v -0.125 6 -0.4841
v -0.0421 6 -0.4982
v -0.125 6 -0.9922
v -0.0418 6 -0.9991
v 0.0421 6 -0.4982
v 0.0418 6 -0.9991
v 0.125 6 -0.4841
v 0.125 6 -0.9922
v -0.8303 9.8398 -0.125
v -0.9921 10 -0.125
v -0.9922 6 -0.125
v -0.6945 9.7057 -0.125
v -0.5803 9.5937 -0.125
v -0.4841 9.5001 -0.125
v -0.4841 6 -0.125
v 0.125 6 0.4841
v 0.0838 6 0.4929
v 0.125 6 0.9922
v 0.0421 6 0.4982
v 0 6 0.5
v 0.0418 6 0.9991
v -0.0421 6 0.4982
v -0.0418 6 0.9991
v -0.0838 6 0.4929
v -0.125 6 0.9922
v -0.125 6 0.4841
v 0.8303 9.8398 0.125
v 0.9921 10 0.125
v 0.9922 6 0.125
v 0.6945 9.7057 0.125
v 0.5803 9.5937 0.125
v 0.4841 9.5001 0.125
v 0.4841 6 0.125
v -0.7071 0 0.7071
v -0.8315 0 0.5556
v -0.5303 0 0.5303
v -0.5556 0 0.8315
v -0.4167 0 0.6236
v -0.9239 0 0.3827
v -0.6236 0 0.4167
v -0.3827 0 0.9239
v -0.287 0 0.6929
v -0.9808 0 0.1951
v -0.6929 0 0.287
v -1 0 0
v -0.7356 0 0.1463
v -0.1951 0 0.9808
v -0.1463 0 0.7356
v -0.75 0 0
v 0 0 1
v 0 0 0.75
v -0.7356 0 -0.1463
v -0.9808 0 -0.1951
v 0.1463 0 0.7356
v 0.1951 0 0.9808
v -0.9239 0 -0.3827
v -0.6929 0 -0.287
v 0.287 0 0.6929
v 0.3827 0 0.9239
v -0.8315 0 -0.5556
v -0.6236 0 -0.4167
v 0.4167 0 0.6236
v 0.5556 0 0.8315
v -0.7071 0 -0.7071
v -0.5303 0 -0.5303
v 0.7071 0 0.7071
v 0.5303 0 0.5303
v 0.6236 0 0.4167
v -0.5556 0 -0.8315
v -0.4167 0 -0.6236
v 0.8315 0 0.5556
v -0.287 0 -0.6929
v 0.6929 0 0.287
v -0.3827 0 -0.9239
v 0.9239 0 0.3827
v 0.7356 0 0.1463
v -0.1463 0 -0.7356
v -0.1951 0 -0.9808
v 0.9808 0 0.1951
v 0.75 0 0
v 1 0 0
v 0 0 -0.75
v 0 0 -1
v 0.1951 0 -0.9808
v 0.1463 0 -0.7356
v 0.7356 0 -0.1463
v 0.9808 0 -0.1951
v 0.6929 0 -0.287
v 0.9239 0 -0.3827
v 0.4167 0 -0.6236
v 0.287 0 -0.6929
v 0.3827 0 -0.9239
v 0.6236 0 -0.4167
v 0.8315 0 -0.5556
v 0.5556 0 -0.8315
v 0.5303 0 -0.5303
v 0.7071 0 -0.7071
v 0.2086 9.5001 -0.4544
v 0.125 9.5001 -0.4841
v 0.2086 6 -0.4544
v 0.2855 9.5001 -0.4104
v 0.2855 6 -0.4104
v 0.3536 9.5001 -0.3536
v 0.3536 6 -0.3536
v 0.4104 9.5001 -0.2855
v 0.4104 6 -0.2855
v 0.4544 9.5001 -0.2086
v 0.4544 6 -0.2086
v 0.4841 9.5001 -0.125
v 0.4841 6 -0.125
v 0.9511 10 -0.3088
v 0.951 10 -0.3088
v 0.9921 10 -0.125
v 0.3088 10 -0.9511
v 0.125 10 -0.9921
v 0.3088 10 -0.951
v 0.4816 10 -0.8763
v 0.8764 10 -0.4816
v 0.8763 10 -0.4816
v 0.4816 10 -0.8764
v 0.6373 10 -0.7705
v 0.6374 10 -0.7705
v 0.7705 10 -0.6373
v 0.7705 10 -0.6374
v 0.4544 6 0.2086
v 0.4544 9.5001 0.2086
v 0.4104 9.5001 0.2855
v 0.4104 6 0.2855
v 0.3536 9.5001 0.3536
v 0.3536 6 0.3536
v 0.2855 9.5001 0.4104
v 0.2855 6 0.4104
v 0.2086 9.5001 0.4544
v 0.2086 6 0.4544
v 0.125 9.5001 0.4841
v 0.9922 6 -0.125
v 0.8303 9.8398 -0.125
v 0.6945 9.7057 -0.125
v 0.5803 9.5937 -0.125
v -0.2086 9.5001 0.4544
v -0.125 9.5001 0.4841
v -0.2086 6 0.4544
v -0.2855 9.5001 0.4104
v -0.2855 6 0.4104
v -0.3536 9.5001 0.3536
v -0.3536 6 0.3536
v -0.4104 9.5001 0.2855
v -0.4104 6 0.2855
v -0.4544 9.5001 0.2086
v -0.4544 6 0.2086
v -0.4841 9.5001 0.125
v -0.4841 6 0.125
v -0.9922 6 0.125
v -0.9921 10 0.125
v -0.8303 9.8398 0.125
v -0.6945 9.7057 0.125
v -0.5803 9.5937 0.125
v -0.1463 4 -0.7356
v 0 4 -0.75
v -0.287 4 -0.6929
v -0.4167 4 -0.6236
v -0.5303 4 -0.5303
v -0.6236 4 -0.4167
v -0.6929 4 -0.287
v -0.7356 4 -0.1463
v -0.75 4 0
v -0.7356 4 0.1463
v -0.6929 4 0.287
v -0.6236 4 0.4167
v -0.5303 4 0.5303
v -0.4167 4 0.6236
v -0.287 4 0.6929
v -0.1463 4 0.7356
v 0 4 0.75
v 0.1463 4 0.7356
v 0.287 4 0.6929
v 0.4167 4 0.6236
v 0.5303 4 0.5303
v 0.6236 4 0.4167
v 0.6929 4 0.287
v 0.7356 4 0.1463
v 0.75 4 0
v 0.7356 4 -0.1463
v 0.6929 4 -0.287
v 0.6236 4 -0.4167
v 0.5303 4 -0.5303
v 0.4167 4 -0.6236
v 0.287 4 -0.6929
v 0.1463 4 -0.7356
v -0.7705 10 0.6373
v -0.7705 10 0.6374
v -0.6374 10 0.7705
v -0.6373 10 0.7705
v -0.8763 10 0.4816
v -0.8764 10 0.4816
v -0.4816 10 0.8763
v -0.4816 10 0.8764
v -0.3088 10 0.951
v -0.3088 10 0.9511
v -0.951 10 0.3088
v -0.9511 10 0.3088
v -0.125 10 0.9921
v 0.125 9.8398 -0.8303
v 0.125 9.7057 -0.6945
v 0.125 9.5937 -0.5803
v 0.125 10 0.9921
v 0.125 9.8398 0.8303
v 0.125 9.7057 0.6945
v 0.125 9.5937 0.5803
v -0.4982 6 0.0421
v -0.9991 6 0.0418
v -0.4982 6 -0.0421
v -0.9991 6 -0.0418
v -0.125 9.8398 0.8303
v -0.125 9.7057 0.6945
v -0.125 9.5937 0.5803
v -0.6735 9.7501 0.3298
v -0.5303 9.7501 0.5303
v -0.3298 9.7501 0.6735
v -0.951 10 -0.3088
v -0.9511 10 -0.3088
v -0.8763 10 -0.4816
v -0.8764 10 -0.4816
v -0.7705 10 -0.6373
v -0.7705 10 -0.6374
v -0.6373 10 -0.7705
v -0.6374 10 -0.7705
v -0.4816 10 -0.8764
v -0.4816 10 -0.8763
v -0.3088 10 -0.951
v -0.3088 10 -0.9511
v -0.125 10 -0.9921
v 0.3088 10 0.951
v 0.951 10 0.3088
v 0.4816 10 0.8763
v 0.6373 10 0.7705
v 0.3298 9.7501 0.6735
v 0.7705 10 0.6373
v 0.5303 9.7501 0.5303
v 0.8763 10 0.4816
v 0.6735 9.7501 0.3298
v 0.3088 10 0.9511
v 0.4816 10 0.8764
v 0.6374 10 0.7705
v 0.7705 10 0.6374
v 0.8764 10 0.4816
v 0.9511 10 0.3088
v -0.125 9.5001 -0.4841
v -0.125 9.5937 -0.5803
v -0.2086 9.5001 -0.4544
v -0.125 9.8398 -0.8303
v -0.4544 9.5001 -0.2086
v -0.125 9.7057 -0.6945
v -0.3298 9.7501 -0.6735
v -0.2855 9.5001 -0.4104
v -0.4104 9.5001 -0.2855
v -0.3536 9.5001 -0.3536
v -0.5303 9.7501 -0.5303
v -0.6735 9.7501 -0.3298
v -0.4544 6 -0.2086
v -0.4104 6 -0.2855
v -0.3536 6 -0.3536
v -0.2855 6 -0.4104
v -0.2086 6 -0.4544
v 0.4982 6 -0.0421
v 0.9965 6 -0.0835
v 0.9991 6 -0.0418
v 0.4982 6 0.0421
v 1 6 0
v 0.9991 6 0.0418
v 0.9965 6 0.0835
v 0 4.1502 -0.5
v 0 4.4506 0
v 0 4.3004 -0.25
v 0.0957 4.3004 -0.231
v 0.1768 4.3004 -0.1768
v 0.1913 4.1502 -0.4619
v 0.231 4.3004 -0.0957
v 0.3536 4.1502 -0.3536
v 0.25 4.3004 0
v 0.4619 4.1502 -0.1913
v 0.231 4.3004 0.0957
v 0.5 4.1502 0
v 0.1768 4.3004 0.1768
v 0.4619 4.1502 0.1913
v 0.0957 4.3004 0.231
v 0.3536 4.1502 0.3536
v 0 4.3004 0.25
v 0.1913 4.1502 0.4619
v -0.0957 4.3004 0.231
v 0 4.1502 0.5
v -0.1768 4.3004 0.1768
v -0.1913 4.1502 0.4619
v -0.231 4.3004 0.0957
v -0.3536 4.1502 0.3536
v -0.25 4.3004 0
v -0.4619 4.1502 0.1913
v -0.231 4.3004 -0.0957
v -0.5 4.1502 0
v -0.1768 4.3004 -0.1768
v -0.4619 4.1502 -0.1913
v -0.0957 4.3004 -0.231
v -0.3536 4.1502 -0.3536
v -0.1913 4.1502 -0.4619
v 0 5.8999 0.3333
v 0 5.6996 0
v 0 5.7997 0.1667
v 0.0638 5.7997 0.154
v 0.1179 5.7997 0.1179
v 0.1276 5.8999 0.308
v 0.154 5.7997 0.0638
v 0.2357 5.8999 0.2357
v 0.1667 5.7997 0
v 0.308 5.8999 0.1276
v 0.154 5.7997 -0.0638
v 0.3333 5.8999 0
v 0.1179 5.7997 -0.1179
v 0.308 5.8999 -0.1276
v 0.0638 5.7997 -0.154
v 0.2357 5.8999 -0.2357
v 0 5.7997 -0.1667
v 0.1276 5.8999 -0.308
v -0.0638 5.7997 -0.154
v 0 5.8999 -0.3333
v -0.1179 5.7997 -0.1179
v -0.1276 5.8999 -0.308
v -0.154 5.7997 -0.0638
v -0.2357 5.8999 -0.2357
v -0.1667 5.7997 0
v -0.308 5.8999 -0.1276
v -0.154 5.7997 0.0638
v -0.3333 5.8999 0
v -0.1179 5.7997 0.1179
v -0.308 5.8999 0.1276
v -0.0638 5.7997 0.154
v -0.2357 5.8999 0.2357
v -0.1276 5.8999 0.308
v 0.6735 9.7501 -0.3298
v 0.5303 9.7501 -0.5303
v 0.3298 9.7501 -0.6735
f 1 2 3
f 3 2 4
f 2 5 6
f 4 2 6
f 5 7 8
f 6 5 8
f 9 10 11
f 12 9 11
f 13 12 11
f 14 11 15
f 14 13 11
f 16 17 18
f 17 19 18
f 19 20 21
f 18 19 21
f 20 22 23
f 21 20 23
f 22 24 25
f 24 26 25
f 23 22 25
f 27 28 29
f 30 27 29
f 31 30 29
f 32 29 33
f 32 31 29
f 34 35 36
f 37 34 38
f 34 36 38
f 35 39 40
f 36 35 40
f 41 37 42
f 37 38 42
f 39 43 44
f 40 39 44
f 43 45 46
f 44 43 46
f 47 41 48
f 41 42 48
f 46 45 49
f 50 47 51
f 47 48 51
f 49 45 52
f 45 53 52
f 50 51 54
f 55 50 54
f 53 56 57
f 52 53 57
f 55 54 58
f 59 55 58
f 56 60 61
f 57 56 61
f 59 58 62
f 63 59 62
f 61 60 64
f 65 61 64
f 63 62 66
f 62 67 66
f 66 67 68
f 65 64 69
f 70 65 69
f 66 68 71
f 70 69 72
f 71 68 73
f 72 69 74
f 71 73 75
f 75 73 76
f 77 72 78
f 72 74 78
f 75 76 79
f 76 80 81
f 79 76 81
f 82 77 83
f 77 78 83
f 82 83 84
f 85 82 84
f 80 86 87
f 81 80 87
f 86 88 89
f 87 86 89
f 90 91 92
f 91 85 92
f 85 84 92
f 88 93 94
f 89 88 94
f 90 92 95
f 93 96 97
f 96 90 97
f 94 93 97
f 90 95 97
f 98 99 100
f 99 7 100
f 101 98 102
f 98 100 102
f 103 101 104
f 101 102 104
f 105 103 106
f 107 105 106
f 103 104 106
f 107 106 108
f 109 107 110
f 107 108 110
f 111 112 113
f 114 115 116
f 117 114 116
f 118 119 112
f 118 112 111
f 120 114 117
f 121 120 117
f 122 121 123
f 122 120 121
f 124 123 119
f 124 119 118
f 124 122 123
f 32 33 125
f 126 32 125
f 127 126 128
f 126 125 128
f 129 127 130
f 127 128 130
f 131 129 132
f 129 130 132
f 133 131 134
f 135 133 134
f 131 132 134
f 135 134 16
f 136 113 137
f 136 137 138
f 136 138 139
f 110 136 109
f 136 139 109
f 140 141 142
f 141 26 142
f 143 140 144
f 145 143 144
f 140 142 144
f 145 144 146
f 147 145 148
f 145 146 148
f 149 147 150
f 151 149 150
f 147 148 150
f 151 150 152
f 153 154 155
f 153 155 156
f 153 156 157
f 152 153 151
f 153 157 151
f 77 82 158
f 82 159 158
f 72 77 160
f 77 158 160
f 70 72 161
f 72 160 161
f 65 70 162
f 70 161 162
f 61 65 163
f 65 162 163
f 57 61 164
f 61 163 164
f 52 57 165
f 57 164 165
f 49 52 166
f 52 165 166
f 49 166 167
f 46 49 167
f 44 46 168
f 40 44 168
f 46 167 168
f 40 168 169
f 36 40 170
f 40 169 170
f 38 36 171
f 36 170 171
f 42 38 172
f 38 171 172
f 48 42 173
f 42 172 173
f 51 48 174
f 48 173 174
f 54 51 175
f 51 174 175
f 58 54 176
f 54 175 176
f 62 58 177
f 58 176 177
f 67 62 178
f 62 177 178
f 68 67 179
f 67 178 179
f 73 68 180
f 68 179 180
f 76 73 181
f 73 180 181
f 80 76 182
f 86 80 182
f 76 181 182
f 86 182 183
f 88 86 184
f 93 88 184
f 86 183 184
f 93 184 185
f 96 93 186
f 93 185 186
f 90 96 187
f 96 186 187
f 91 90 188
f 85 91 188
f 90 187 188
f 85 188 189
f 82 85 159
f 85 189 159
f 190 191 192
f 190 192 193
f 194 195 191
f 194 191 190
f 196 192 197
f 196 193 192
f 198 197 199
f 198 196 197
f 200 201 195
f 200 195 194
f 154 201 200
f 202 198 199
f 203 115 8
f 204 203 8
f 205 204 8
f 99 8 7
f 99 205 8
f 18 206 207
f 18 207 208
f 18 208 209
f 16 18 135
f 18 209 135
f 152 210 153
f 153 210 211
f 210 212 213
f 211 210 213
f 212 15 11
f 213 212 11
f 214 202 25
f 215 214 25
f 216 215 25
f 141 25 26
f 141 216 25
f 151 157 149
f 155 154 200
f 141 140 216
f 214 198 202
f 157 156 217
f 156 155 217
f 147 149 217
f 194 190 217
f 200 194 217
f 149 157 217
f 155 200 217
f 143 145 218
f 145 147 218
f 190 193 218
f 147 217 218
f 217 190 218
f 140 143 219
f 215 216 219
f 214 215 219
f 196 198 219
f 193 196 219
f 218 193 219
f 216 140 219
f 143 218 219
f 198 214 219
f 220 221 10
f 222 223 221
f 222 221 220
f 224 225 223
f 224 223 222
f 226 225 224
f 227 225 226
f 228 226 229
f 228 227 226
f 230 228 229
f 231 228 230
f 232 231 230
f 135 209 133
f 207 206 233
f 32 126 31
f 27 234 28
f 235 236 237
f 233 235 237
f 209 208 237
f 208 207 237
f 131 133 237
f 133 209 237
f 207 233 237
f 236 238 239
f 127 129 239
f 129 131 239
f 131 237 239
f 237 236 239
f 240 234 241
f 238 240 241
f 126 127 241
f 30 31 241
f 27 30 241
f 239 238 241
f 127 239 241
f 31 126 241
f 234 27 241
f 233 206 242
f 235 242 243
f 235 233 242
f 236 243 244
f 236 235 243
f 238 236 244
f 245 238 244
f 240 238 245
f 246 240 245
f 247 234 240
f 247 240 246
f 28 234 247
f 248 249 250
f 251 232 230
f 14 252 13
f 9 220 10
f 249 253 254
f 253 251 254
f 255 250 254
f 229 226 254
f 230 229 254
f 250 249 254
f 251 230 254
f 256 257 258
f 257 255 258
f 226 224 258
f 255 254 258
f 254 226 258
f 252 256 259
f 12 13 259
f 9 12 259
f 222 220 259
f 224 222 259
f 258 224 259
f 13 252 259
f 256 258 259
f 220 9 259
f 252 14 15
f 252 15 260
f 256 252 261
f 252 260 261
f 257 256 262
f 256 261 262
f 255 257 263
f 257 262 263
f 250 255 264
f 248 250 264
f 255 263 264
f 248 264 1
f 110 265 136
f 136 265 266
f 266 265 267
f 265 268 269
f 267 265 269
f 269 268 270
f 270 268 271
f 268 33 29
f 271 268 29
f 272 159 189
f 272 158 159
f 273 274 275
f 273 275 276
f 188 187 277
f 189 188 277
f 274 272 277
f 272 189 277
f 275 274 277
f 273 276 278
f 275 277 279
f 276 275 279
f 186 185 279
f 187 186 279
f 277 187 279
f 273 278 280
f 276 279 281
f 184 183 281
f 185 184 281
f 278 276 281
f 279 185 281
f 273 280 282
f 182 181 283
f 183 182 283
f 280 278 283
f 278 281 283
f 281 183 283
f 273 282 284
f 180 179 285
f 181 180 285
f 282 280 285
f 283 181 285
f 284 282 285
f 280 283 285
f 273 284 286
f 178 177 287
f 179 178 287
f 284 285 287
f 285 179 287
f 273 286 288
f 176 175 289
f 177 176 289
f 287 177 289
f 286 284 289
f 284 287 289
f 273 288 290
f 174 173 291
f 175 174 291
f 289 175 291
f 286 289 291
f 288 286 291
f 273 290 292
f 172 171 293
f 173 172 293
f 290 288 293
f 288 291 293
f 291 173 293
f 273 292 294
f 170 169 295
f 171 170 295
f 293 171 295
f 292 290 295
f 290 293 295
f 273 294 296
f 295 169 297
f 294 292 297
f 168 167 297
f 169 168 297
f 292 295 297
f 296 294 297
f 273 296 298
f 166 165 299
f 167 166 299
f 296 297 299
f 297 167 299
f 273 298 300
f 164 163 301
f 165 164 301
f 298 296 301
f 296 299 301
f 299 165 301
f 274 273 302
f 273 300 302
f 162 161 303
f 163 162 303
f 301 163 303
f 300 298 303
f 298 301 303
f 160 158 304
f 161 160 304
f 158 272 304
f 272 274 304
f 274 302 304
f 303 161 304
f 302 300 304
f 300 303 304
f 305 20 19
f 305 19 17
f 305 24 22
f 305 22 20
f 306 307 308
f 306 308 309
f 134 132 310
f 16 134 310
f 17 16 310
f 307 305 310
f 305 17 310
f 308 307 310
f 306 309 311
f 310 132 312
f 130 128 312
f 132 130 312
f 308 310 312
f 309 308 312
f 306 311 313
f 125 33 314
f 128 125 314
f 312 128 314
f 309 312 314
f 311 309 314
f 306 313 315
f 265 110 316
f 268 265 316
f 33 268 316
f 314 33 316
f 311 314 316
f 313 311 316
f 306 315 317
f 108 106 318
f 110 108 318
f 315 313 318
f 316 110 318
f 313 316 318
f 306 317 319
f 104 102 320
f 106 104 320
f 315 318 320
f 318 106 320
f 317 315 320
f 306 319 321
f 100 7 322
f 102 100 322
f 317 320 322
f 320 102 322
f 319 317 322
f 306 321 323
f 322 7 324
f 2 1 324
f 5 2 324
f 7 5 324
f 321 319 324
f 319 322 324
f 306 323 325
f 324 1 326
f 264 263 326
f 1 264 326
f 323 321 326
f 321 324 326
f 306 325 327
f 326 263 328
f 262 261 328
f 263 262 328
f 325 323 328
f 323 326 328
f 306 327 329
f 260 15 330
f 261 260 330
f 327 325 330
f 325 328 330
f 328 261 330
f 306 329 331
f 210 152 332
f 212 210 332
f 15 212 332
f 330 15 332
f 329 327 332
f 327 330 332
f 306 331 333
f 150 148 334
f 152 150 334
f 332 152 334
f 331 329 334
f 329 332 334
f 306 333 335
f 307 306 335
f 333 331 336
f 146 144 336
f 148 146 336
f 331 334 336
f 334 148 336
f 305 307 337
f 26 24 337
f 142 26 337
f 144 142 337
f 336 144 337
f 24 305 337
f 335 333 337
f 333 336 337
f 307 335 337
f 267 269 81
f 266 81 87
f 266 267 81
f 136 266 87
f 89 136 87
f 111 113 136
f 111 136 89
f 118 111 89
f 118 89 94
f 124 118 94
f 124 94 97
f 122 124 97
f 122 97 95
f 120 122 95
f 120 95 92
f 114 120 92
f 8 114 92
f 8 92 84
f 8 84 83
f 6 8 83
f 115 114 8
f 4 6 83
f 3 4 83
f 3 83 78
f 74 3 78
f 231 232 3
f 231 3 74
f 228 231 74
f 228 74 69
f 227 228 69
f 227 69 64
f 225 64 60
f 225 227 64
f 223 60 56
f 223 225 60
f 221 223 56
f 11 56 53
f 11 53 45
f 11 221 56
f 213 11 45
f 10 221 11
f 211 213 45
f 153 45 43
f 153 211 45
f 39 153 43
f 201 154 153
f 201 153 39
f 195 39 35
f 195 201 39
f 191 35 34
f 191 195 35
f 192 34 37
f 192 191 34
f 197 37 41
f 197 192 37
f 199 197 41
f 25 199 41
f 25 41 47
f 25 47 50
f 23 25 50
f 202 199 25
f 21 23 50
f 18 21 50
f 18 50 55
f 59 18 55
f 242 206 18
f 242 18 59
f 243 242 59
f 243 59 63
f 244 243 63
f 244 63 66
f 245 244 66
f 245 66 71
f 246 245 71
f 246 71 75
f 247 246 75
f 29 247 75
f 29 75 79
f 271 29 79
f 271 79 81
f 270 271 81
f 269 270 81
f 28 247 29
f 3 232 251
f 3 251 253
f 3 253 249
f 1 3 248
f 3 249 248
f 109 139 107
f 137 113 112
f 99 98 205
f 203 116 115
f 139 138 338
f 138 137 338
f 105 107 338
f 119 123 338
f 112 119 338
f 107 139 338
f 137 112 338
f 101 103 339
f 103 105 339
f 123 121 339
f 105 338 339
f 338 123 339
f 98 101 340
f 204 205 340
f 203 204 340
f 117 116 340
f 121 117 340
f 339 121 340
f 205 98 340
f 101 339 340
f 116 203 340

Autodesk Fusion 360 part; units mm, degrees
cylinder "CylinderPrimitive1" add diameter 2 height 10 placed x (1, 0, 0) y (0, 0, -1) z (0, 1, 0) at (0, 0, 0)
hole "Hole1" at (0, 10, 0) direction (0, -1, 0) diameter 1 depth 4 tip angle 118
hole "Hole2" at (0, 0, 0) direction (0, 1, 0) diameter 1.5 depth 4 tip angle 118
chamfer "Chamfer1" distance 0.5 angle 45 1 edges at (0.1808, 10, -0.4662) measured on face at (0.8291, 10, 0.0621)
sketch "Sketch2" plane through (0, 0, 0) normal (1, 0, 0) x (0, 0, -1)
  line L0 (-2.7313, 12.0493) -> (-0.0081, 12.0493)
  line L1 (-0.0081, 12.0493) -> (-0.0081, 6)
  line L2 (-0.0081, 6) -> (-2.7313, 6)
  line L3 (-2.7313, 6) -> (-2.7313, 12.0493)
  line L4 (1, 10) -> (-1, 10)
  dimension "d15" = 4
extrude "Extrude1" cut sketch "Sketch2" along normal mid plane 0.25
pattern_circular "C-Pattern1" count 4 over 360 about axis through (0, 1.75, 0) along (0, 1, 0) of "Extrude1"
